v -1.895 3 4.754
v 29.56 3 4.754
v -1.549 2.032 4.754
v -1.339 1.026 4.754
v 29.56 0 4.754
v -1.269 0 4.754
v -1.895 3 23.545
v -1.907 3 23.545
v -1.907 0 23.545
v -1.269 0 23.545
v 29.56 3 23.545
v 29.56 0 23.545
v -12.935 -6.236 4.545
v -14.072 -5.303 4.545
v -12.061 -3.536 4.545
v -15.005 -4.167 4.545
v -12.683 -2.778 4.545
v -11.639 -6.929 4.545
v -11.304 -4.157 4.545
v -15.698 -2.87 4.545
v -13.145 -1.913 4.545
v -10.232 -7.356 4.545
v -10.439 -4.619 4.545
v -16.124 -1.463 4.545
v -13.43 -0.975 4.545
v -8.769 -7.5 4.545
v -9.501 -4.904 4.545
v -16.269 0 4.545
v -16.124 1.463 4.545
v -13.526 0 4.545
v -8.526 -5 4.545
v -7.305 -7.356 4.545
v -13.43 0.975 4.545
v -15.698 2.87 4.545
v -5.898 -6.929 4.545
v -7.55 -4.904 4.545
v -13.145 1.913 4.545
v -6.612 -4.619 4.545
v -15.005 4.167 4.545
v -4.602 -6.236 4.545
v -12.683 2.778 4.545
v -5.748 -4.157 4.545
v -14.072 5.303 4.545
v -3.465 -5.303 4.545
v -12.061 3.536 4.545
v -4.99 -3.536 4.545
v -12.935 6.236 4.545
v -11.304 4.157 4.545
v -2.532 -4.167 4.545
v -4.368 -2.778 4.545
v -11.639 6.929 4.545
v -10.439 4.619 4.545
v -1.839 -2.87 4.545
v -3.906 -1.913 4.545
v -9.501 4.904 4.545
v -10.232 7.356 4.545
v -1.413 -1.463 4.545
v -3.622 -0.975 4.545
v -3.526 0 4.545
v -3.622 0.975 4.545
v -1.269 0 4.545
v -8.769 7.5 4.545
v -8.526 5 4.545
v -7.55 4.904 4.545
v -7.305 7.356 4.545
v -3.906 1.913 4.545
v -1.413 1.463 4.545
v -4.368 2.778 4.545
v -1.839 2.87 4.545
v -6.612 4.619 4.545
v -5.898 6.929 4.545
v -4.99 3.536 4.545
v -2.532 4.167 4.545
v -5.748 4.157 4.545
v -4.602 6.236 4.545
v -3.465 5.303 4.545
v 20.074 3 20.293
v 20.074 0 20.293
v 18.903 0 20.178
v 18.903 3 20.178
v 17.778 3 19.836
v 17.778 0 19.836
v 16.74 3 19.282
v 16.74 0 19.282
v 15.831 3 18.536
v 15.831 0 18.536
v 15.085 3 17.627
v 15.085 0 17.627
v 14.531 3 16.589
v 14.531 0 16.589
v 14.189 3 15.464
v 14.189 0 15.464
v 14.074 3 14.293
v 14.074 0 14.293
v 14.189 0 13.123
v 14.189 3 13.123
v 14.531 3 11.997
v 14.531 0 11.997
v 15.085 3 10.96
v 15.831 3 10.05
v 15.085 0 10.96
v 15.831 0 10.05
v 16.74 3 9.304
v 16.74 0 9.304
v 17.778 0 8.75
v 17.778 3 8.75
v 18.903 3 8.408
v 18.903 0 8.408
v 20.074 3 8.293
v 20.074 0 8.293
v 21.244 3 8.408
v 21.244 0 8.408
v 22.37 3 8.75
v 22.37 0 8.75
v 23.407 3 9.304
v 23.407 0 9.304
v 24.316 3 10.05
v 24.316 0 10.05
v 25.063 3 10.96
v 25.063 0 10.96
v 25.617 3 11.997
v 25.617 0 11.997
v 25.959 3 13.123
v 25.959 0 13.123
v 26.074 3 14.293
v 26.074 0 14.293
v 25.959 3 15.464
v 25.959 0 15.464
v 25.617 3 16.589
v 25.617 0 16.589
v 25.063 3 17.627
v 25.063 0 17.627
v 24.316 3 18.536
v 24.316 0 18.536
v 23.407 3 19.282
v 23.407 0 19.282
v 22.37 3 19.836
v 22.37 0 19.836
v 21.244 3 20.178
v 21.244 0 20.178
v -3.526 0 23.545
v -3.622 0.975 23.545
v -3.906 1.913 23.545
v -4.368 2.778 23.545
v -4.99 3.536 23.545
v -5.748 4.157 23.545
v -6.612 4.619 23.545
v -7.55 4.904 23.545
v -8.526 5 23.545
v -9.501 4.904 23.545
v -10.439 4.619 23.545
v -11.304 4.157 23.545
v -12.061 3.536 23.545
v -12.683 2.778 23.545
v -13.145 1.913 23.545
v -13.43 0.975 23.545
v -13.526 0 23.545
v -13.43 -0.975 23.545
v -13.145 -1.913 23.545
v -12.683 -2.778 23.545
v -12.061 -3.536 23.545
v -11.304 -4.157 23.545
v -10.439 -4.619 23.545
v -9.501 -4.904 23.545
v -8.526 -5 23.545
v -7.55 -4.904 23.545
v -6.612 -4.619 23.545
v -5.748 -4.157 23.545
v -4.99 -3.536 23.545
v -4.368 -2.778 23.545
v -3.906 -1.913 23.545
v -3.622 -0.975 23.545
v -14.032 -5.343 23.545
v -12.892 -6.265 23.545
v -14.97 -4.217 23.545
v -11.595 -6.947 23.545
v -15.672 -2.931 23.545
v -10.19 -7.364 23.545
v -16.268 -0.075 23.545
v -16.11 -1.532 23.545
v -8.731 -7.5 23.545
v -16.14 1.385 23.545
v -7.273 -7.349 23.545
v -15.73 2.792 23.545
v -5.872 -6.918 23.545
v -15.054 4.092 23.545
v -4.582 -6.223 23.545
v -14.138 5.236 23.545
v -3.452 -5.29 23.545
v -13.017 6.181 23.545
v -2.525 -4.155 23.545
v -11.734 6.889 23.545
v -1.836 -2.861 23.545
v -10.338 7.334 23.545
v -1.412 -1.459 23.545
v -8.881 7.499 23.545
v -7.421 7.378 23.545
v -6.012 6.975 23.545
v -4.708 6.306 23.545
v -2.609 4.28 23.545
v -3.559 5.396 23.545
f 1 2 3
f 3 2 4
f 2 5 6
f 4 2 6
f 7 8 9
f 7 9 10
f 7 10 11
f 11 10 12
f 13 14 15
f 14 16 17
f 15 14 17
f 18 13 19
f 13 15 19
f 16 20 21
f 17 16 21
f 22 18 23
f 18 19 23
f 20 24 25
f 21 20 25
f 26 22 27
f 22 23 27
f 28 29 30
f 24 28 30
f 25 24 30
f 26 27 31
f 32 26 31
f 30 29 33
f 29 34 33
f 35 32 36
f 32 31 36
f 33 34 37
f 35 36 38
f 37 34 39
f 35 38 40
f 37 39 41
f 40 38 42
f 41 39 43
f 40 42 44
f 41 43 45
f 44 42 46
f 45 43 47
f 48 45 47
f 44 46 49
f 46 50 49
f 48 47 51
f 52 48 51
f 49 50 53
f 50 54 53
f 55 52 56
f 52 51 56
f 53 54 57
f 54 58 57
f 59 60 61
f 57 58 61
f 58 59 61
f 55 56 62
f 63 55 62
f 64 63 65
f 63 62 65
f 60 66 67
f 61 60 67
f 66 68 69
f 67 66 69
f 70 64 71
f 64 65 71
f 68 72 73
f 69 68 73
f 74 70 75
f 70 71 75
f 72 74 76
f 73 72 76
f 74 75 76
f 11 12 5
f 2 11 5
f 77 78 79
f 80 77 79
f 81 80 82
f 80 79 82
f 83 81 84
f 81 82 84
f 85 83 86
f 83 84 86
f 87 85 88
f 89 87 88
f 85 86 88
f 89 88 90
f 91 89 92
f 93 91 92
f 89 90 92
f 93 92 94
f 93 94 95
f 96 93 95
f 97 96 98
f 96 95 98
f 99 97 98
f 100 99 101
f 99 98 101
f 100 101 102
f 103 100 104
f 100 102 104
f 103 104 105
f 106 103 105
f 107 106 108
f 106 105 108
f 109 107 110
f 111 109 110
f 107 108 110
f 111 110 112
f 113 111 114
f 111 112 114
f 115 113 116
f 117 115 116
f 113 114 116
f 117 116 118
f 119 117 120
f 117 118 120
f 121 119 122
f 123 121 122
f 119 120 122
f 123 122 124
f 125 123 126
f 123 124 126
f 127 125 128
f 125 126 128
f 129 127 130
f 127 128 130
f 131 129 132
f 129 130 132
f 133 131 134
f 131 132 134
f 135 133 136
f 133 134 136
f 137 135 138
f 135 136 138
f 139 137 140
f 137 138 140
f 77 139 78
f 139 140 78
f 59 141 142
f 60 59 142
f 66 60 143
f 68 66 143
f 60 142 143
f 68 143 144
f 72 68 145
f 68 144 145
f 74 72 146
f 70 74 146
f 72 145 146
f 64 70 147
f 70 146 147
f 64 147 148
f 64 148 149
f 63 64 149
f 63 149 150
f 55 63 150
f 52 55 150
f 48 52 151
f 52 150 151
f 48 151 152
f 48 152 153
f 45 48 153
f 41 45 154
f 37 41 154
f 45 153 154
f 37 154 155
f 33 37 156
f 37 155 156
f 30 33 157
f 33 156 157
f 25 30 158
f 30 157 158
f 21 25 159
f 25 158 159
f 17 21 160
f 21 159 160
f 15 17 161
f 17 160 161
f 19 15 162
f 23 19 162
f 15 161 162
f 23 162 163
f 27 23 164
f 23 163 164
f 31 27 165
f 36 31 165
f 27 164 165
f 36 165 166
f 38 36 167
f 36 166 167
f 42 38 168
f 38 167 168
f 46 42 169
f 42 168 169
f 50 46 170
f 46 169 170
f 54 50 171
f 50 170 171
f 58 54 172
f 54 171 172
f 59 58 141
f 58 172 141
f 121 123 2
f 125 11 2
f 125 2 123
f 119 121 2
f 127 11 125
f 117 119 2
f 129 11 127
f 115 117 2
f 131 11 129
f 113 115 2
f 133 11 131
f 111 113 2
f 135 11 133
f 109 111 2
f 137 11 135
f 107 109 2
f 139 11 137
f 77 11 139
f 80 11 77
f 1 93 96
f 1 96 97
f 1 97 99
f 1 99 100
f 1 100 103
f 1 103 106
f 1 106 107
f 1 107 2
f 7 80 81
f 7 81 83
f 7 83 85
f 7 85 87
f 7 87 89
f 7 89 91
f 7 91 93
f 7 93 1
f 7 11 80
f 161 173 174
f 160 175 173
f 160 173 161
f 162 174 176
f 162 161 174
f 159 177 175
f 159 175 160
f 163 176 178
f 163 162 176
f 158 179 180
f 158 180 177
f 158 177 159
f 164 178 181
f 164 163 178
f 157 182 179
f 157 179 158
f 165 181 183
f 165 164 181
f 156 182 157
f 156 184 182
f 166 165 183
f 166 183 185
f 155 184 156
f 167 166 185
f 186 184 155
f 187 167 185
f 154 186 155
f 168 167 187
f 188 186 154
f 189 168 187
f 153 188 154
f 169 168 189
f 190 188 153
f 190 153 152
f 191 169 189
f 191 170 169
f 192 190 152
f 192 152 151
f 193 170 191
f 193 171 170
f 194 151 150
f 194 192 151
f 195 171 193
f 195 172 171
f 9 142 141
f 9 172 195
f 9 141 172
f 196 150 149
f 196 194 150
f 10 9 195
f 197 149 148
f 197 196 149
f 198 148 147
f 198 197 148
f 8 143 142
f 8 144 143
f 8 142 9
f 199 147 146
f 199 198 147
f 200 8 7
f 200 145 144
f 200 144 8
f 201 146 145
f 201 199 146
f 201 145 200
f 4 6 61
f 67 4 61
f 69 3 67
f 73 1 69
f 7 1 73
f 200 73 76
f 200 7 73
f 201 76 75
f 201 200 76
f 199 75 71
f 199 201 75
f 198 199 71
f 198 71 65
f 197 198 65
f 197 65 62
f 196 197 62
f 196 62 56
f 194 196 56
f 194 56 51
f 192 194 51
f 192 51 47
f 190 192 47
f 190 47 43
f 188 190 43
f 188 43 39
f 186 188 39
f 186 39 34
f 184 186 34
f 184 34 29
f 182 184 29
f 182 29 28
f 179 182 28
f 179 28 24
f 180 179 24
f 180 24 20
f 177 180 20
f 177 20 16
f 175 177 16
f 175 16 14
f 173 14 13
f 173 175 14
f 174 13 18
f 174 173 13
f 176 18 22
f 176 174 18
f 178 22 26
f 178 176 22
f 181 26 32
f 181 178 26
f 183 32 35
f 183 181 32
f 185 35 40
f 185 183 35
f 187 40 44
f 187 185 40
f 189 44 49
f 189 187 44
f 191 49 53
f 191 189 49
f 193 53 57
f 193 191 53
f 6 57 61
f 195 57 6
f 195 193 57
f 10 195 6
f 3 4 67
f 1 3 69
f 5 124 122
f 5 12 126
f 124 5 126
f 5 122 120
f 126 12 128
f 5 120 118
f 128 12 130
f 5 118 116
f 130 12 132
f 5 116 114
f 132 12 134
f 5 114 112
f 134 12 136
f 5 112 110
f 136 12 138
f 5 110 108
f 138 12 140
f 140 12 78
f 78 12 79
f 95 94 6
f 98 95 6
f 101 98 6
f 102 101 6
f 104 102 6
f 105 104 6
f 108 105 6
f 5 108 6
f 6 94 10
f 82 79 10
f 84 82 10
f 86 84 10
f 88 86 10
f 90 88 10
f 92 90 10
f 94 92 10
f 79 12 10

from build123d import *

# Parameters (mm, degrees)
F_3DSKETCH1_R       = 6
BOSS_EXTRUDE3_DEPTH = 3
SKETCH3_R           = 7.5
SKETCH3_R_2         = 5
BOSS_EXTRUDE5_DEPTH = 19


with BuildPart() as part:
    # 3DSketch1 → Boss-Extrude3 (new body)
    with BuildSketch(Plane(origin=(-1.906972696, 0, 4.753867784), x_dir=(0.8585635359116023, 0, 0.5127071823204421), z_dir=(0, -1, 0))):
        Polygon((0, 0), (9.634447543, 16.133546855), (36.65118441, 0), (27.016736867, -16.133546855), align=None)
        with Locations(Location((23.762707279, -3.079667236, 0), (0, 0, 59.155677363))):
            Circle(F_3DSKETCH1_R, mode=Mode.SUBTRACT)
    extrude(amount=-BOSS_EXTRUDE3_DEPTH)

    # Sketch3 → Boss-Extrude5 (add)
    with BuildSketch(Plane(origin=(-8.525652269, 0, 23.545193271), x_dir=(1, 0, 0), z_dir=(0, 0, 1))):
        with Locations((-0.242866193, 0)):
            Circle(SKETCH3_R)
        Circle(SKETCH3_R_2, mode=Mode.SUBTRACT)
    extrude(amount=-BOSS_EXTRUDE5_DEPTH)


solid = part.part
